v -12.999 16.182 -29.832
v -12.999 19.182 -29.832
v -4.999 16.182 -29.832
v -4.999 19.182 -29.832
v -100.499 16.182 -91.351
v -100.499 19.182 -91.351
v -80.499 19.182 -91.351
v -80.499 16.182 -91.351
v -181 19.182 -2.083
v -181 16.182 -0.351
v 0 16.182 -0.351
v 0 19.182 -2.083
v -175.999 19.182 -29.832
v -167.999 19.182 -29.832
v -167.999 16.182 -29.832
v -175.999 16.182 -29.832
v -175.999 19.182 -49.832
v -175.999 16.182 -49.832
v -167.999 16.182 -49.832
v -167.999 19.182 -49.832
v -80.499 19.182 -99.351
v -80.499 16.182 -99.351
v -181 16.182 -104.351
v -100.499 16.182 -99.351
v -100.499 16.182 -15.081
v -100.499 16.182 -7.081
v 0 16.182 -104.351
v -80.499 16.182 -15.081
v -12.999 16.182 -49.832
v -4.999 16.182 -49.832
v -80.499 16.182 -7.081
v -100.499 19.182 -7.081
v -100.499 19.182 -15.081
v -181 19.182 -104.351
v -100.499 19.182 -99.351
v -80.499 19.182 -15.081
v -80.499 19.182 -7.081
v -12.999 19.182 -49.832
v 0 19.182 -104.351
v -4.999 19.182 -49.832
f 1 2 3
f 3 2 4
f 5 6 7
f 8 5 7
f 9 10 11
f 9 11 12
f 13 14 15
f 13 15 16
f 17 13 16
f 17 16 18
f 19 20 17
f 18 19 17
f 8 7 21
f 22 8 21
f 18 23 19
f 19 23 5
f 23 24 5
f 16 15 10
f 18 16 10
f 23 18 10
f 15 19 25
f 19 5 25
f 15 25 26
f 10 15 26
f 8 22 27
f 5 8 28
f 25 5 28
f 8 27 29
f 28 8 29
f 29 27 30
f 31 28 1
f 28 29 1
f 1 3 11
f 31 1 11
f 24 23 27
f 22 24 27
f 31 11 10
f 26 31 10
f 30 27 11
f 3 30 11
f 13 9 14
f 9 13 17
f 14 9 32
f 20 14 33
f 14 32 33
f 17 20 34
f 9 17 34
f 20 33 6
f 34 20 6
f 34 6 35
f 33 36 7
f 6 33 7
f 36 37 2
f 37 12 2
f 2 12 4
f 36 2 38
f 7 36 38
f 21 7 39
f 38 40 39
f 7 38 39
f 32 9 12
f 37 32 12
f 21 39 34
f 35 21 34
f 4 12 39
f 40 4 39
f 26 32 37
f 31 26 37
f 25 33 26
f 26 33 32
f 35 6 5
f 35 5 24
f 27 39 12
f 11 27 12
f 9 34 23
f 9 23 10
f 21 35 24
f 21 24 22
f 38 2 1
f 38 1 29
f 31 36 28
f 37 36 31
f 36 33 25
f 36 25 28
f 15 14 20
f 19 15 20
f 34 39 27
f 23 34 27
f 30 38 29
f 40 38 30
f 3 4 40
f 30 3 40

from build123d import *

# Parameters (mm, degrees)
BOSS_EXTRUDE1_DEPTH = 181
SKETCH2_W           = 20
SKETCH2_H           = 8
SKETCH2_W_2         = 8
SKETCH2_H_2         = 20
CUT_EXTRUDE1_DEPTH  = 4
SKETCH3_W           = 11.684269825
SKETCH3_H           = 21.954659585
BOSS_EXTRUDE2_DEPTH = 3


with BuildPart() as part:
    # Sketch1 → Boss-Extrude1 (new body)
    with BuildSketch(Plane(origin=(0, 0, 0), x_dir=(0, 0, -1), z_dir=(1, 0, 0))):
        Polygon((0.351294643, 16.181618247), (2.08334545, 19.181618247), (104.351294643, 19.181618247), (104.351294643, 16.181618247), align=None)
    extrude(amount=-BOSS_EXTRUDE1_DEPTH)

    # Sketch2 → Cut-Extrude1 (cut)
    with BuildSketch(Plane(origin=(0, 19.181618247, 0), x_dir=(1, 0, 0), z_dir=(0, 1, 0))):
        with Locations((-90.499224225, 95.351294643)):
            Rectangle(SKETCH2_W, SKETCH2_H)
        with Locations((-8.999224225, 39.831548681)):
            Rectangle(SKETCH2_W_2, SKETCH2_H_2)
    cut_extrude1 = extrude(amount=-CUT_EXTRUDE1_DEPTH, mode=Mode.SUBTRACT)

    # Mirror1: Cut-Extrude1 across plane
    add(cut_extrude1.mirror(Plane.ZY.offset(90.499224225)), mode=Mode.SUBTRACT)

    # Mirror2: Cut-Extrude1 across plane
    add(cut_extrude1.mirror(Plane(origin=(0, 0, -53.216294643), x_dir=(1, 0, 0), z_dir=(0, 0, -1))), mode=Mode.SUBTRACT)

    # Sketch3 → Boss-Extrude2 (add)
    with BuildSketch(Plane(origin=(0, 19.181618247, 0), x_dir=(1, 0, 0), z_dir=(0, 1, 0))):
        with Locations((-10.841359137, 66.584328743)):
            Rectangle(SKETCH3_W, SKETCH3_H)
    extrude(amount=-BOSS_EXTRUDE2_DEPTH)


solid = part.part
